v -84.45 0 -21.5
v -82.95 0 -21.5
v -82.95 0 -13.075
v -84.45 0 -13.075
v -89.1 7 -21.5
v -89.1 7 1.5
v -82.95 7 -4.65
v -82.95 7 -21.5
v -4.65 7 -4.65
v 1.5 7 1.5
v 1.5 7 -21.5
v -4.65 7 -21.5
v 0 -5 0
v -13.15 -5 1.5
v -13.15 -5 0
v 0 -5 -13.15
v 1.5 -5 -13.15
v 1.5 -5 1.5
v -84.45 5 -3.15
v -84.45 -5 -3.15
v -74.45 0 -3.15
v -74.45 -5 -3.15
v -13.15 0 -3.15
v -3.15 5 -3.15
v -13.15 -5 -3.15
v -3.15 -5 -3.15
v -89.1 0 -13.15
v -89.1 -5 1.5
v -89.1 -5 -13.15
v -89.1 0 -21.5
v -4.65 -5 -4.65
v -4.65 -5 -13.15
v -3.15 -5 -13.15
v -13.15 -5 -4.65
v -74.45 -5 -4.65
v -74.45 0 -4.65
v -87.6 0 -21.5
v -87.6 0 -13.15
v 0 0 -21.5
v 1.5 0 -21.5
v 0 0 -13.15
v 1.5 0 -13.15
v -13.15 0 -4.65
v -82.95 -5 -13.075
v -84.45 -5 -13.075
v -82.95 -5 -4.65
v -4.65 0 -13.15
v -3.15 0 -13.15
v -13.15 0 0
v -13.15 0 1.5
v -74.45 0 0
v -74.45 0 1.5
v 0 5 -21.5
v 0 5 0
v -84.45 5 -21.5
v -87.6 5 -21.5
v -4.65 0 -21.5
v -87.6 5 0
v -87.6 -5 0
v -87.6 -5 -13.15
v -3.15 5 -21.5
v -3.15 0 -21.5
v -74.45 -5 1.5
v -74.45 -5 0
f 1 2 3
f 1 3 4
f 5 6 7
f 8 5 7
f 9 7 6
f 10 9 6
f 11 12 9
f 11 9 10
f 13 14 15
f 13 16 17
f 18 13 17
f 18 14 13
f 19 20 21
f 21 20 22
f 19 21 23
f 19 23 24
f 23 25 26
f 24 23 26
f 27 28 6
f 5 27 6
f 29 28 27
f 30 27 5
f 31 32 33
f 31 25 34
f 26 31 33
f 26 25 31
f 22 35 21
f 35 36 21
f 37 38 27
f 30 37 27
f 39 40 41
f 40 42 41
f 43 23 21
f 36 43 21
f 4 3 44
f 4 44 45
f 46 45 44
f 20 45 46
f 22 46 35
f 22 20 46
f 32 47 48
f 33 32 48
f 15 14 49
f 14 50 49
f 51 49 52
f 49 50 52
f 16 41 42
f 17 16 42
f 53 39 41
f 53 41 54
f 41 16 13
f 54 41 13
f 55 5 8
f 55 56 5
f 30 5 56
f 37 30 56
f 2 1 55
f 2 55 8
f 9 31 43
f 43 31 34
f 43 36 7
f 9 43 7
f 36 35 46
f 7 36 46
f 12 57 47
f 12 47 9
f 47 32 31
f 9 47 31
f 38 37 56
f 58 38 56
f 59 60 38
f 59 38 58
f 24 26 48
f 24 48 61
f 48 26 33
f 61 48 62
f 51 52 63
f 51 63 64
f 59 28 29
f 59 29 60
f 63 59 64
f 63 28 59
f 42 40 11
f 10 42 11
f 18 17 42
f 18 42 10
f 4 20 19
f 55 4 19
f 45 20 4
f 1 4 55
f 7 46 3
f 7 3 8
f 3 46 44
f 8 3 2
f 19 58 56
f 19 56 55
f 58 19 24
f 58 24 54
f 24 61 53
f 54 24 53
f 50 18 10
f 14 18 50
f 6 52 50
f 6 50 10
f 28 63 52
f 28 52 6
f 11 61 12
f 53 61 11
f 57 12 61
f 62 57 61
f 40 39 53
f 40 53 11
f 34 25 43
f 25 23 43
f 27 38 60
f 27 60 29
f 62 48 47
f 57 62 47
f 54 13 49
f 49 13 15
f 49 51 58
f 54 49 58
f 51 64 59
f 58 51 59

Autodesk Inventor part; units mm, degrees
ref_plane "YZ Plane" through (0, 0, 0) normal (1, 0, 0) x (0, 1, 0)
ref_plane "XZ Plane" through (0, 0, 0) normal (0, 1, 0) x (-1, 0, 0)
ref_plane "XY Plane" through (0, 0, 0) normal (0, 0, 1) x (1, 0, 0)
sketch "Sketch1" plane through (0, 0, 0) normal (0, 1, 0) x (-1, 0, 0)
  line L0 (0, 0) -> (3.15, 0)
  line L1 (3.15, 0) -> (3.15, -20)
  line L2 (3.15, -20) -> (0, -20)
  line L3 (0, -20) -> (0, 0)
  line L4 (0, 0) -> (20, 0)
  line L5 (20, 0) -> (20, -3.15)
  line L6 (20, -3.15) -> (0, -3.15)
  line L7 (0, -3.15) -> (0, 0)
  line L8 (-1.5, 1.5) -> (4.65, 1.5)
  line L9 (4.65, 1.5) -> (4.65, -21.5)
  line L10 (4.65, -21.5) -> (-1.5, -21.5)
  line L11 (-1.5, -21.5) -> (-1.5, 1.5)
  line L12 (21.5, 1.5) -> (-1.5, 1.5)
  line L13 (-1.5, 1.5) -> (-1.5, -4.65)
  line L14 (-1.5, -4.65) -> (21.5, -4.65)
  line L15 (21.5, -4.65) -> (21.5, 1.5)
  line L16 (3.15, -20) -> (3.15, -21.5)
  line L17 (0, -20) -> (0, -21.5)
  line L18 (20, 0) -> (21.5, 0)
  line L19 (20, -3.15) -> (21.5, -3.15)
  line L20 (0, 0) -> (87.6, 0)
  line L21 (87.6, 0) -> (87.6, -3.15)
  line L22 (87.6, -3.15) -> (0, -3.15)
  line L23 (0, -3.15) -> (0, 0)
  line L24 (87.6, 0) -> (89.1, 0)
  line L25 (89.1, 0) -> (89.1, -21.5)
  line L26 (89.1, -21.5) -> (87.6, -21.5)
  line L27 (87.6, -21.5) -> (87.6, 0)
  line L28 (89.1, 0) -> (69.1, 0)
  line L29 (69.1, 0) -> (69.1, 1.5)
  line L30 (69.1, 1.5) -> (89.1, 1.5)
  line L31 (89.1, 1.5) -> (89.1, 0)
  line L32 (87.6, -3.15) -> (84.45, -3.15)
  line L33 (84.45, -3.15) -> (84.45, -21.5)
  line L34 (84.45, -21.5) -> (87.6, -21.5)
  line L35 (87.6, -21.5) -> (87.6, -3.15)
  line L36 (84.45, -3.15) -> (82.95, -3.15)
  line L37 (82.95, -3.15) -> (82.95, -21.5)
  line L38 (82.95, -21.5) -> (84.45, -21.5)
  line L39 (84.45, -21.5) -> (84.45, -3.15)
  line L40 (82.95, -3.15) -> (69.1, -3.15)
  line L41 (69.1, -3.15) -> (69.1, -4.65)
  line L42 (69.1, -4.65) -> (82.95, -4.65)
  line L43 (82.95, -4.65) -> (82.95, -3.15)
  line L44 (69.1, -4.65) -> (21.5, -4.65)
  line L45 (21.5, -4.65) -> (21.5, -3.15)
  line L46 (21.5, -3.15) -> (69.1, -3.15)
  line L47 (69.1, -3.15) -> (69.1, -4.65)
  line L48 (69.1, 1.5) -> (21.5, 1.5)
  line L49 (21.5, 1.5) -> (21.5, 0)
  line L50 (21.5, 0) -> (69.1, 0)
  line L51 (69.1, 0) -> (69.1, 1.5)
  point P0 (3.15, -3.15)
  point P1 (4.65, -4.65)
  point P2 (4.65, 1.5)
  point P3 (69.1, 0)
  point P4 (84.45, -3.15)
  point P5 (69.1, -3.15)
  point P6 (21.5, -4.65)
  point P7 (21.5, -3.15)
  dimension "d0" = 3.15
  dimension "d1" = 3.15
  dimension "d2" = 20
  dimension "d3" = 20
  dimension "d4" = 1.5
  dimension "d5" = 1.5
  dimension "d16" = 87.6
  dimension "d17" = 0
  dimension "d18" = 0
  dimension "d19" = 20
  dimension "d20" = 1.5
  dimension "d21" = 3.15
  dimension "d22" = 0
  dimension "d23" = 0
  dimension "d24" = 0
  dimension "d25" = 0
  dimension "d26" = 1.5
  dimension "d27" = 1.5
extrude "Extrusion1" add sketch "Sketch1" along normal blind 5 contours L3 L14 L11 L8 L9 L4 L0 | L6 L9 L14 L1 | L9 L12 L15 L18 L4 | L3 L17 L10 L11 L14 | L14 L9 L10 L16 L1 | L6 L19 L15 L14 L9 | L15 L48 L29 L20 | L15 L22 L41 L44 | L29 L30 L31 L24 L20 | L41 L22 L37 L42 | L24 L25 L26 L27 L21 | L37 L22 L33 L38
sketch "Sketch2" plane through (0, 5, 0) normal (0, 1, 0) x (1, 0, 0)
  line L0 (-3.15, 3.15) -> (-3.15, 21.5) projected
  line L1 (-3.15, 21.5) -> (-4.65, 21.5) projected
  line L2 (-4.65, 21.5) -> (-4.65, 4.65) projected
  line L3 (1.5, -1.5) -> (1.5, 21.5) projected
  line L4 (1.5, 21.5) -> (0, 21.5) projected
  line L5 (0, 21.5) -> (0, 0) projected
  line L6 (0, 0) -> (-21.5, 0) projected
  line L7 (-21.5, 0) -> (-21.5, 3)
  line L8 (-3.15, 3.15) -> (-3.15, 21.5) projected
  line L9 (-3.15, 21.5) -> (0, 21.5)
  line L10 (-89.1, 21.5) -> (-89.1, -1.5) projected
  line L11 (-82.95, 4.65) -> (-82.95, 21.5) projected
  line L12 (-89.1, -1.5) -> (-68.78, -1.5) projected
  line L13 (-68.78, 4.5) -> (-82.95, 4.5) projected
  line L14 (-87.6, 21.5) -> (-89.1, 21.5) projected
  line L15 (-89.1, 21.5) -> (-82.95, 21.5)
  line L16 (-82.95, 21.5) -> (-82.95, -1.5)
  line L17 (-82.95, -1.5) -> (-89.1, -1.5)
  line L18 (-89.1, -1.5) -> (-89.1, 21.5)
  line L19 (-68.78, -1.5) -> (-82.95, -1.5)
  line L20 (-82.95, -1.5) -> (-82.95, 4.65)
  line L21 (-82.95, 4.65) -> (-68.78, 4.65)
  line L22 (-68.78, 4.65) -> (-68.78, -1.5)
  line L23 (0, 0) -> (-87.6, 0) projected
  line L24 (-87.6, 0) -> (-87.6, 21.5) projected
  line L25 (-87.6, 21.5) -> (-89.1, 21.5) projected
  line L26 (-89.1, 21.5) -> (-89.1, -1.5) projected
  line L27 (-89.1, -1.5) -> (1.5, -1.5) projected
  line L28 (-84.45, 3.15) -> (-3.15, 3.15) projected
  line L29 (-4.65, 4.65) -> (-82.95, 4.65) projected
  line L30 (-82.95, 4.65) -> (-82.95, 21.5) projected
  line L31 (-82.95, 21.5) -> (-84.45, 21.5) projected
  line L32 (-84.45, 21.5) -> (-84.45, 3.15) projected
  point P0 (-82.95, 4.65)
  point P1 (-68.78, 4.65)
  dimension "d31" = 0
extrude "Extrusion2" add sketch "Sketch2" along normal blind 2
sketch "Sketch3" plane through (0, 0, 0) normal (0, -1, 0) x (1, 0, 0)
  line L0 (-4.65, -21.5) -> (-4.65, -4.65) projected
  line L1 (-3.15, -21.5) -> (-4.65, -21.5) projected
  line L2 (-3.15, -3.15) -> (-3.15, -21.5) projected
  line L3 (0, -21.5) -> (0, 0) projected
  line L4 (1.5, -21.5) -> (0, -21.5) projected
  line L5 (1.5, 1.5) -> (1.5, -21.5) projected
  line L6 (-21.5, -3) -> (-3.15, -3) projected
  line L7 (-4.65, -21.5) -> (-4.65, -4.65) projected
  line L8 (-3.15, -3.15) -> (-4.65, -3.15)
  line L9 (-4.65, -3.15) -> (-4.65, -13.15)
  line L10 (-4.65, -13.15) -> (-3.15, -13.15)
  line L11 (-3.15, -13.15) -> (-3.15, -3.15)
  line L12 (-3.15, -3.15) -> (-3.15, -21.5) projected
  line L13 (-3.15, -3.15) -> (-13.15, -3.15)
  line L14 (-13.15, -3.15) -> (-13.15, -4.65)
  line L15 (-13.15, -4.65) -> (-3.15, -4.65)
  line L16 (-3.15, -4.65) -> (-3.15, -3.15)
  line L17 (-21.5, 1.5) -> (1.5, 1.5) projected
  line L18 (0, -21.5) -> (0, 0) projected
  line L19 (1.5, 1.5) -> (0, 1.5)
  line L20 (0, 1.5) -> (0, -13.15)
  line L21 (0, -13.15) -> (1.5, -13.15)
  line L22 (1.5, -13.15) -> (1.5, 1.5)
  line L23 (1.5, 1.5) -> (-13.15, 1.5)
  line L24 (-13.15, 1.5) -> (-13.15, 0)
  line L25 (-13.15, 0) -> (1.5, 0)
  line L26 (1.5, 0) -> (1.5, 1.5)
  line L27 (-89.1, -21.5) -> (-89.1, 1.5) projected
  line L28 (0, 0) -> (-87.6, 0) projected
  line L29 (-89.1, 1.5) -> (-74.45, 1.5)
  line L30 (-74.45, 1.5) -> (-74.45, 0)
  line L31 (-74.45, 0) -> (-89.1, 0)
  line L32 (-89.1, 0) -> (-89.1, 1.5)
  line L33 (-89.1, 1.5) -> (-68.78, 1.5) projected
  line L34 (-89.1, 1.5) -> (-87.6, 1.5)
  line L35 (-87.6, 1.5) -> (-87.6, -13.15)
  line L36 (-87.6, -13.15) -> (-89.1, -13.15)
  line L37 (-89.1, -13.15) -> (-89.1, 1.5)
  line L38 (-84.45, -21.5) -> (-84.45, -3.15) projected
  line L39 (-74.45, -3.15) -> (-84.45, -3.15)
  line L40 (-84.45, -3.15) -> (-84.45, -4.65)
  line L41 (-84.45, -4.65) -> (-74.45, -4.65)
  line L42 (-74.45, -4.65) -> (-74.45, -3.15)
  line L43 (-84.45, -3.15) -> (-3.15, -3.15) projected
  line L44 (-82.95, -4.65) -> (-82.95, -21.5) projected
  line L45 (-84.45, -3.15) -> (-82.95, -3.15)
  line L46 (-82.95, -3.15) -> (-82.95, -13.075)
  line L47 (-82.95, -13.075) -> (-84.45, -13.075)
  line L48 (-84.45, -13.075) -> (-84.45, -3.15)
  line L49 (0, 0) -> (-87.6, 0) projected
  line L50 (-89.1, 1.5) -> (1.5, 1.5) projected
  line L51 (-89.1, -21.5) -> (-89.1, 1.5) projected
  line L52 (-87.6, -21.5) -> (-89.1, -21.5) projected
  line L53 (-87.6, 0) -> (-87.6, -21.5) projected
  line L54 (-84.45, -3.15) -> (-3.15, -3.15) projected
  line L55 (-84.45, -21.5) -> (-84.45, -3.15) projected
  line L56 (-82.95, -21.5) -> (-84.45, -21.5) projected
  line L57 (-82.95, -4.65) -> (-82.95, -21.5) projected
  line L58 (-4.65, -4.65) -> (-82.95, -4.65) projected
  point P0 (-3.15, -13.15)
  point P1 (-68.78, 0)
  point P2 (-68.78, -3)
  point P3 (1.5, 0)
  point P4 (-3.15, -4.65)
  point P5 (-4.65, -4.65)
  point P6 (-13, -3)
  point P7 (-4.65, -4.65)
  dimension "d10" = 10
  dimension "d11" = 10
  dimension "d12" = 14.65
  dimension "d13" = 14.65
  dimension "d28" = 14.65
  dimension "d29" = 14.65
  dimension "d30" = 10
  dimension "d32" = 0
  dimension "d33" = 0
extrude "Extrusion3" add sketch "Sketch3" along normal blind 5 contours L0 L15 L2 L10 | L15 L14 L13 L9 | L9 L8 L2 L15 | L41 L46 L39 L42 | L44 L47 L38 L41 | L41 L38 L39 L46 | L3 L25 L5 L21 | L25 L24 L17 L20 | L20 L17 L5 L25 | L28 L35 L29 L30 | L35 L36 L27 L31 | L31 L27 L29 L35
properties part number "Glass ConnectorV2"
